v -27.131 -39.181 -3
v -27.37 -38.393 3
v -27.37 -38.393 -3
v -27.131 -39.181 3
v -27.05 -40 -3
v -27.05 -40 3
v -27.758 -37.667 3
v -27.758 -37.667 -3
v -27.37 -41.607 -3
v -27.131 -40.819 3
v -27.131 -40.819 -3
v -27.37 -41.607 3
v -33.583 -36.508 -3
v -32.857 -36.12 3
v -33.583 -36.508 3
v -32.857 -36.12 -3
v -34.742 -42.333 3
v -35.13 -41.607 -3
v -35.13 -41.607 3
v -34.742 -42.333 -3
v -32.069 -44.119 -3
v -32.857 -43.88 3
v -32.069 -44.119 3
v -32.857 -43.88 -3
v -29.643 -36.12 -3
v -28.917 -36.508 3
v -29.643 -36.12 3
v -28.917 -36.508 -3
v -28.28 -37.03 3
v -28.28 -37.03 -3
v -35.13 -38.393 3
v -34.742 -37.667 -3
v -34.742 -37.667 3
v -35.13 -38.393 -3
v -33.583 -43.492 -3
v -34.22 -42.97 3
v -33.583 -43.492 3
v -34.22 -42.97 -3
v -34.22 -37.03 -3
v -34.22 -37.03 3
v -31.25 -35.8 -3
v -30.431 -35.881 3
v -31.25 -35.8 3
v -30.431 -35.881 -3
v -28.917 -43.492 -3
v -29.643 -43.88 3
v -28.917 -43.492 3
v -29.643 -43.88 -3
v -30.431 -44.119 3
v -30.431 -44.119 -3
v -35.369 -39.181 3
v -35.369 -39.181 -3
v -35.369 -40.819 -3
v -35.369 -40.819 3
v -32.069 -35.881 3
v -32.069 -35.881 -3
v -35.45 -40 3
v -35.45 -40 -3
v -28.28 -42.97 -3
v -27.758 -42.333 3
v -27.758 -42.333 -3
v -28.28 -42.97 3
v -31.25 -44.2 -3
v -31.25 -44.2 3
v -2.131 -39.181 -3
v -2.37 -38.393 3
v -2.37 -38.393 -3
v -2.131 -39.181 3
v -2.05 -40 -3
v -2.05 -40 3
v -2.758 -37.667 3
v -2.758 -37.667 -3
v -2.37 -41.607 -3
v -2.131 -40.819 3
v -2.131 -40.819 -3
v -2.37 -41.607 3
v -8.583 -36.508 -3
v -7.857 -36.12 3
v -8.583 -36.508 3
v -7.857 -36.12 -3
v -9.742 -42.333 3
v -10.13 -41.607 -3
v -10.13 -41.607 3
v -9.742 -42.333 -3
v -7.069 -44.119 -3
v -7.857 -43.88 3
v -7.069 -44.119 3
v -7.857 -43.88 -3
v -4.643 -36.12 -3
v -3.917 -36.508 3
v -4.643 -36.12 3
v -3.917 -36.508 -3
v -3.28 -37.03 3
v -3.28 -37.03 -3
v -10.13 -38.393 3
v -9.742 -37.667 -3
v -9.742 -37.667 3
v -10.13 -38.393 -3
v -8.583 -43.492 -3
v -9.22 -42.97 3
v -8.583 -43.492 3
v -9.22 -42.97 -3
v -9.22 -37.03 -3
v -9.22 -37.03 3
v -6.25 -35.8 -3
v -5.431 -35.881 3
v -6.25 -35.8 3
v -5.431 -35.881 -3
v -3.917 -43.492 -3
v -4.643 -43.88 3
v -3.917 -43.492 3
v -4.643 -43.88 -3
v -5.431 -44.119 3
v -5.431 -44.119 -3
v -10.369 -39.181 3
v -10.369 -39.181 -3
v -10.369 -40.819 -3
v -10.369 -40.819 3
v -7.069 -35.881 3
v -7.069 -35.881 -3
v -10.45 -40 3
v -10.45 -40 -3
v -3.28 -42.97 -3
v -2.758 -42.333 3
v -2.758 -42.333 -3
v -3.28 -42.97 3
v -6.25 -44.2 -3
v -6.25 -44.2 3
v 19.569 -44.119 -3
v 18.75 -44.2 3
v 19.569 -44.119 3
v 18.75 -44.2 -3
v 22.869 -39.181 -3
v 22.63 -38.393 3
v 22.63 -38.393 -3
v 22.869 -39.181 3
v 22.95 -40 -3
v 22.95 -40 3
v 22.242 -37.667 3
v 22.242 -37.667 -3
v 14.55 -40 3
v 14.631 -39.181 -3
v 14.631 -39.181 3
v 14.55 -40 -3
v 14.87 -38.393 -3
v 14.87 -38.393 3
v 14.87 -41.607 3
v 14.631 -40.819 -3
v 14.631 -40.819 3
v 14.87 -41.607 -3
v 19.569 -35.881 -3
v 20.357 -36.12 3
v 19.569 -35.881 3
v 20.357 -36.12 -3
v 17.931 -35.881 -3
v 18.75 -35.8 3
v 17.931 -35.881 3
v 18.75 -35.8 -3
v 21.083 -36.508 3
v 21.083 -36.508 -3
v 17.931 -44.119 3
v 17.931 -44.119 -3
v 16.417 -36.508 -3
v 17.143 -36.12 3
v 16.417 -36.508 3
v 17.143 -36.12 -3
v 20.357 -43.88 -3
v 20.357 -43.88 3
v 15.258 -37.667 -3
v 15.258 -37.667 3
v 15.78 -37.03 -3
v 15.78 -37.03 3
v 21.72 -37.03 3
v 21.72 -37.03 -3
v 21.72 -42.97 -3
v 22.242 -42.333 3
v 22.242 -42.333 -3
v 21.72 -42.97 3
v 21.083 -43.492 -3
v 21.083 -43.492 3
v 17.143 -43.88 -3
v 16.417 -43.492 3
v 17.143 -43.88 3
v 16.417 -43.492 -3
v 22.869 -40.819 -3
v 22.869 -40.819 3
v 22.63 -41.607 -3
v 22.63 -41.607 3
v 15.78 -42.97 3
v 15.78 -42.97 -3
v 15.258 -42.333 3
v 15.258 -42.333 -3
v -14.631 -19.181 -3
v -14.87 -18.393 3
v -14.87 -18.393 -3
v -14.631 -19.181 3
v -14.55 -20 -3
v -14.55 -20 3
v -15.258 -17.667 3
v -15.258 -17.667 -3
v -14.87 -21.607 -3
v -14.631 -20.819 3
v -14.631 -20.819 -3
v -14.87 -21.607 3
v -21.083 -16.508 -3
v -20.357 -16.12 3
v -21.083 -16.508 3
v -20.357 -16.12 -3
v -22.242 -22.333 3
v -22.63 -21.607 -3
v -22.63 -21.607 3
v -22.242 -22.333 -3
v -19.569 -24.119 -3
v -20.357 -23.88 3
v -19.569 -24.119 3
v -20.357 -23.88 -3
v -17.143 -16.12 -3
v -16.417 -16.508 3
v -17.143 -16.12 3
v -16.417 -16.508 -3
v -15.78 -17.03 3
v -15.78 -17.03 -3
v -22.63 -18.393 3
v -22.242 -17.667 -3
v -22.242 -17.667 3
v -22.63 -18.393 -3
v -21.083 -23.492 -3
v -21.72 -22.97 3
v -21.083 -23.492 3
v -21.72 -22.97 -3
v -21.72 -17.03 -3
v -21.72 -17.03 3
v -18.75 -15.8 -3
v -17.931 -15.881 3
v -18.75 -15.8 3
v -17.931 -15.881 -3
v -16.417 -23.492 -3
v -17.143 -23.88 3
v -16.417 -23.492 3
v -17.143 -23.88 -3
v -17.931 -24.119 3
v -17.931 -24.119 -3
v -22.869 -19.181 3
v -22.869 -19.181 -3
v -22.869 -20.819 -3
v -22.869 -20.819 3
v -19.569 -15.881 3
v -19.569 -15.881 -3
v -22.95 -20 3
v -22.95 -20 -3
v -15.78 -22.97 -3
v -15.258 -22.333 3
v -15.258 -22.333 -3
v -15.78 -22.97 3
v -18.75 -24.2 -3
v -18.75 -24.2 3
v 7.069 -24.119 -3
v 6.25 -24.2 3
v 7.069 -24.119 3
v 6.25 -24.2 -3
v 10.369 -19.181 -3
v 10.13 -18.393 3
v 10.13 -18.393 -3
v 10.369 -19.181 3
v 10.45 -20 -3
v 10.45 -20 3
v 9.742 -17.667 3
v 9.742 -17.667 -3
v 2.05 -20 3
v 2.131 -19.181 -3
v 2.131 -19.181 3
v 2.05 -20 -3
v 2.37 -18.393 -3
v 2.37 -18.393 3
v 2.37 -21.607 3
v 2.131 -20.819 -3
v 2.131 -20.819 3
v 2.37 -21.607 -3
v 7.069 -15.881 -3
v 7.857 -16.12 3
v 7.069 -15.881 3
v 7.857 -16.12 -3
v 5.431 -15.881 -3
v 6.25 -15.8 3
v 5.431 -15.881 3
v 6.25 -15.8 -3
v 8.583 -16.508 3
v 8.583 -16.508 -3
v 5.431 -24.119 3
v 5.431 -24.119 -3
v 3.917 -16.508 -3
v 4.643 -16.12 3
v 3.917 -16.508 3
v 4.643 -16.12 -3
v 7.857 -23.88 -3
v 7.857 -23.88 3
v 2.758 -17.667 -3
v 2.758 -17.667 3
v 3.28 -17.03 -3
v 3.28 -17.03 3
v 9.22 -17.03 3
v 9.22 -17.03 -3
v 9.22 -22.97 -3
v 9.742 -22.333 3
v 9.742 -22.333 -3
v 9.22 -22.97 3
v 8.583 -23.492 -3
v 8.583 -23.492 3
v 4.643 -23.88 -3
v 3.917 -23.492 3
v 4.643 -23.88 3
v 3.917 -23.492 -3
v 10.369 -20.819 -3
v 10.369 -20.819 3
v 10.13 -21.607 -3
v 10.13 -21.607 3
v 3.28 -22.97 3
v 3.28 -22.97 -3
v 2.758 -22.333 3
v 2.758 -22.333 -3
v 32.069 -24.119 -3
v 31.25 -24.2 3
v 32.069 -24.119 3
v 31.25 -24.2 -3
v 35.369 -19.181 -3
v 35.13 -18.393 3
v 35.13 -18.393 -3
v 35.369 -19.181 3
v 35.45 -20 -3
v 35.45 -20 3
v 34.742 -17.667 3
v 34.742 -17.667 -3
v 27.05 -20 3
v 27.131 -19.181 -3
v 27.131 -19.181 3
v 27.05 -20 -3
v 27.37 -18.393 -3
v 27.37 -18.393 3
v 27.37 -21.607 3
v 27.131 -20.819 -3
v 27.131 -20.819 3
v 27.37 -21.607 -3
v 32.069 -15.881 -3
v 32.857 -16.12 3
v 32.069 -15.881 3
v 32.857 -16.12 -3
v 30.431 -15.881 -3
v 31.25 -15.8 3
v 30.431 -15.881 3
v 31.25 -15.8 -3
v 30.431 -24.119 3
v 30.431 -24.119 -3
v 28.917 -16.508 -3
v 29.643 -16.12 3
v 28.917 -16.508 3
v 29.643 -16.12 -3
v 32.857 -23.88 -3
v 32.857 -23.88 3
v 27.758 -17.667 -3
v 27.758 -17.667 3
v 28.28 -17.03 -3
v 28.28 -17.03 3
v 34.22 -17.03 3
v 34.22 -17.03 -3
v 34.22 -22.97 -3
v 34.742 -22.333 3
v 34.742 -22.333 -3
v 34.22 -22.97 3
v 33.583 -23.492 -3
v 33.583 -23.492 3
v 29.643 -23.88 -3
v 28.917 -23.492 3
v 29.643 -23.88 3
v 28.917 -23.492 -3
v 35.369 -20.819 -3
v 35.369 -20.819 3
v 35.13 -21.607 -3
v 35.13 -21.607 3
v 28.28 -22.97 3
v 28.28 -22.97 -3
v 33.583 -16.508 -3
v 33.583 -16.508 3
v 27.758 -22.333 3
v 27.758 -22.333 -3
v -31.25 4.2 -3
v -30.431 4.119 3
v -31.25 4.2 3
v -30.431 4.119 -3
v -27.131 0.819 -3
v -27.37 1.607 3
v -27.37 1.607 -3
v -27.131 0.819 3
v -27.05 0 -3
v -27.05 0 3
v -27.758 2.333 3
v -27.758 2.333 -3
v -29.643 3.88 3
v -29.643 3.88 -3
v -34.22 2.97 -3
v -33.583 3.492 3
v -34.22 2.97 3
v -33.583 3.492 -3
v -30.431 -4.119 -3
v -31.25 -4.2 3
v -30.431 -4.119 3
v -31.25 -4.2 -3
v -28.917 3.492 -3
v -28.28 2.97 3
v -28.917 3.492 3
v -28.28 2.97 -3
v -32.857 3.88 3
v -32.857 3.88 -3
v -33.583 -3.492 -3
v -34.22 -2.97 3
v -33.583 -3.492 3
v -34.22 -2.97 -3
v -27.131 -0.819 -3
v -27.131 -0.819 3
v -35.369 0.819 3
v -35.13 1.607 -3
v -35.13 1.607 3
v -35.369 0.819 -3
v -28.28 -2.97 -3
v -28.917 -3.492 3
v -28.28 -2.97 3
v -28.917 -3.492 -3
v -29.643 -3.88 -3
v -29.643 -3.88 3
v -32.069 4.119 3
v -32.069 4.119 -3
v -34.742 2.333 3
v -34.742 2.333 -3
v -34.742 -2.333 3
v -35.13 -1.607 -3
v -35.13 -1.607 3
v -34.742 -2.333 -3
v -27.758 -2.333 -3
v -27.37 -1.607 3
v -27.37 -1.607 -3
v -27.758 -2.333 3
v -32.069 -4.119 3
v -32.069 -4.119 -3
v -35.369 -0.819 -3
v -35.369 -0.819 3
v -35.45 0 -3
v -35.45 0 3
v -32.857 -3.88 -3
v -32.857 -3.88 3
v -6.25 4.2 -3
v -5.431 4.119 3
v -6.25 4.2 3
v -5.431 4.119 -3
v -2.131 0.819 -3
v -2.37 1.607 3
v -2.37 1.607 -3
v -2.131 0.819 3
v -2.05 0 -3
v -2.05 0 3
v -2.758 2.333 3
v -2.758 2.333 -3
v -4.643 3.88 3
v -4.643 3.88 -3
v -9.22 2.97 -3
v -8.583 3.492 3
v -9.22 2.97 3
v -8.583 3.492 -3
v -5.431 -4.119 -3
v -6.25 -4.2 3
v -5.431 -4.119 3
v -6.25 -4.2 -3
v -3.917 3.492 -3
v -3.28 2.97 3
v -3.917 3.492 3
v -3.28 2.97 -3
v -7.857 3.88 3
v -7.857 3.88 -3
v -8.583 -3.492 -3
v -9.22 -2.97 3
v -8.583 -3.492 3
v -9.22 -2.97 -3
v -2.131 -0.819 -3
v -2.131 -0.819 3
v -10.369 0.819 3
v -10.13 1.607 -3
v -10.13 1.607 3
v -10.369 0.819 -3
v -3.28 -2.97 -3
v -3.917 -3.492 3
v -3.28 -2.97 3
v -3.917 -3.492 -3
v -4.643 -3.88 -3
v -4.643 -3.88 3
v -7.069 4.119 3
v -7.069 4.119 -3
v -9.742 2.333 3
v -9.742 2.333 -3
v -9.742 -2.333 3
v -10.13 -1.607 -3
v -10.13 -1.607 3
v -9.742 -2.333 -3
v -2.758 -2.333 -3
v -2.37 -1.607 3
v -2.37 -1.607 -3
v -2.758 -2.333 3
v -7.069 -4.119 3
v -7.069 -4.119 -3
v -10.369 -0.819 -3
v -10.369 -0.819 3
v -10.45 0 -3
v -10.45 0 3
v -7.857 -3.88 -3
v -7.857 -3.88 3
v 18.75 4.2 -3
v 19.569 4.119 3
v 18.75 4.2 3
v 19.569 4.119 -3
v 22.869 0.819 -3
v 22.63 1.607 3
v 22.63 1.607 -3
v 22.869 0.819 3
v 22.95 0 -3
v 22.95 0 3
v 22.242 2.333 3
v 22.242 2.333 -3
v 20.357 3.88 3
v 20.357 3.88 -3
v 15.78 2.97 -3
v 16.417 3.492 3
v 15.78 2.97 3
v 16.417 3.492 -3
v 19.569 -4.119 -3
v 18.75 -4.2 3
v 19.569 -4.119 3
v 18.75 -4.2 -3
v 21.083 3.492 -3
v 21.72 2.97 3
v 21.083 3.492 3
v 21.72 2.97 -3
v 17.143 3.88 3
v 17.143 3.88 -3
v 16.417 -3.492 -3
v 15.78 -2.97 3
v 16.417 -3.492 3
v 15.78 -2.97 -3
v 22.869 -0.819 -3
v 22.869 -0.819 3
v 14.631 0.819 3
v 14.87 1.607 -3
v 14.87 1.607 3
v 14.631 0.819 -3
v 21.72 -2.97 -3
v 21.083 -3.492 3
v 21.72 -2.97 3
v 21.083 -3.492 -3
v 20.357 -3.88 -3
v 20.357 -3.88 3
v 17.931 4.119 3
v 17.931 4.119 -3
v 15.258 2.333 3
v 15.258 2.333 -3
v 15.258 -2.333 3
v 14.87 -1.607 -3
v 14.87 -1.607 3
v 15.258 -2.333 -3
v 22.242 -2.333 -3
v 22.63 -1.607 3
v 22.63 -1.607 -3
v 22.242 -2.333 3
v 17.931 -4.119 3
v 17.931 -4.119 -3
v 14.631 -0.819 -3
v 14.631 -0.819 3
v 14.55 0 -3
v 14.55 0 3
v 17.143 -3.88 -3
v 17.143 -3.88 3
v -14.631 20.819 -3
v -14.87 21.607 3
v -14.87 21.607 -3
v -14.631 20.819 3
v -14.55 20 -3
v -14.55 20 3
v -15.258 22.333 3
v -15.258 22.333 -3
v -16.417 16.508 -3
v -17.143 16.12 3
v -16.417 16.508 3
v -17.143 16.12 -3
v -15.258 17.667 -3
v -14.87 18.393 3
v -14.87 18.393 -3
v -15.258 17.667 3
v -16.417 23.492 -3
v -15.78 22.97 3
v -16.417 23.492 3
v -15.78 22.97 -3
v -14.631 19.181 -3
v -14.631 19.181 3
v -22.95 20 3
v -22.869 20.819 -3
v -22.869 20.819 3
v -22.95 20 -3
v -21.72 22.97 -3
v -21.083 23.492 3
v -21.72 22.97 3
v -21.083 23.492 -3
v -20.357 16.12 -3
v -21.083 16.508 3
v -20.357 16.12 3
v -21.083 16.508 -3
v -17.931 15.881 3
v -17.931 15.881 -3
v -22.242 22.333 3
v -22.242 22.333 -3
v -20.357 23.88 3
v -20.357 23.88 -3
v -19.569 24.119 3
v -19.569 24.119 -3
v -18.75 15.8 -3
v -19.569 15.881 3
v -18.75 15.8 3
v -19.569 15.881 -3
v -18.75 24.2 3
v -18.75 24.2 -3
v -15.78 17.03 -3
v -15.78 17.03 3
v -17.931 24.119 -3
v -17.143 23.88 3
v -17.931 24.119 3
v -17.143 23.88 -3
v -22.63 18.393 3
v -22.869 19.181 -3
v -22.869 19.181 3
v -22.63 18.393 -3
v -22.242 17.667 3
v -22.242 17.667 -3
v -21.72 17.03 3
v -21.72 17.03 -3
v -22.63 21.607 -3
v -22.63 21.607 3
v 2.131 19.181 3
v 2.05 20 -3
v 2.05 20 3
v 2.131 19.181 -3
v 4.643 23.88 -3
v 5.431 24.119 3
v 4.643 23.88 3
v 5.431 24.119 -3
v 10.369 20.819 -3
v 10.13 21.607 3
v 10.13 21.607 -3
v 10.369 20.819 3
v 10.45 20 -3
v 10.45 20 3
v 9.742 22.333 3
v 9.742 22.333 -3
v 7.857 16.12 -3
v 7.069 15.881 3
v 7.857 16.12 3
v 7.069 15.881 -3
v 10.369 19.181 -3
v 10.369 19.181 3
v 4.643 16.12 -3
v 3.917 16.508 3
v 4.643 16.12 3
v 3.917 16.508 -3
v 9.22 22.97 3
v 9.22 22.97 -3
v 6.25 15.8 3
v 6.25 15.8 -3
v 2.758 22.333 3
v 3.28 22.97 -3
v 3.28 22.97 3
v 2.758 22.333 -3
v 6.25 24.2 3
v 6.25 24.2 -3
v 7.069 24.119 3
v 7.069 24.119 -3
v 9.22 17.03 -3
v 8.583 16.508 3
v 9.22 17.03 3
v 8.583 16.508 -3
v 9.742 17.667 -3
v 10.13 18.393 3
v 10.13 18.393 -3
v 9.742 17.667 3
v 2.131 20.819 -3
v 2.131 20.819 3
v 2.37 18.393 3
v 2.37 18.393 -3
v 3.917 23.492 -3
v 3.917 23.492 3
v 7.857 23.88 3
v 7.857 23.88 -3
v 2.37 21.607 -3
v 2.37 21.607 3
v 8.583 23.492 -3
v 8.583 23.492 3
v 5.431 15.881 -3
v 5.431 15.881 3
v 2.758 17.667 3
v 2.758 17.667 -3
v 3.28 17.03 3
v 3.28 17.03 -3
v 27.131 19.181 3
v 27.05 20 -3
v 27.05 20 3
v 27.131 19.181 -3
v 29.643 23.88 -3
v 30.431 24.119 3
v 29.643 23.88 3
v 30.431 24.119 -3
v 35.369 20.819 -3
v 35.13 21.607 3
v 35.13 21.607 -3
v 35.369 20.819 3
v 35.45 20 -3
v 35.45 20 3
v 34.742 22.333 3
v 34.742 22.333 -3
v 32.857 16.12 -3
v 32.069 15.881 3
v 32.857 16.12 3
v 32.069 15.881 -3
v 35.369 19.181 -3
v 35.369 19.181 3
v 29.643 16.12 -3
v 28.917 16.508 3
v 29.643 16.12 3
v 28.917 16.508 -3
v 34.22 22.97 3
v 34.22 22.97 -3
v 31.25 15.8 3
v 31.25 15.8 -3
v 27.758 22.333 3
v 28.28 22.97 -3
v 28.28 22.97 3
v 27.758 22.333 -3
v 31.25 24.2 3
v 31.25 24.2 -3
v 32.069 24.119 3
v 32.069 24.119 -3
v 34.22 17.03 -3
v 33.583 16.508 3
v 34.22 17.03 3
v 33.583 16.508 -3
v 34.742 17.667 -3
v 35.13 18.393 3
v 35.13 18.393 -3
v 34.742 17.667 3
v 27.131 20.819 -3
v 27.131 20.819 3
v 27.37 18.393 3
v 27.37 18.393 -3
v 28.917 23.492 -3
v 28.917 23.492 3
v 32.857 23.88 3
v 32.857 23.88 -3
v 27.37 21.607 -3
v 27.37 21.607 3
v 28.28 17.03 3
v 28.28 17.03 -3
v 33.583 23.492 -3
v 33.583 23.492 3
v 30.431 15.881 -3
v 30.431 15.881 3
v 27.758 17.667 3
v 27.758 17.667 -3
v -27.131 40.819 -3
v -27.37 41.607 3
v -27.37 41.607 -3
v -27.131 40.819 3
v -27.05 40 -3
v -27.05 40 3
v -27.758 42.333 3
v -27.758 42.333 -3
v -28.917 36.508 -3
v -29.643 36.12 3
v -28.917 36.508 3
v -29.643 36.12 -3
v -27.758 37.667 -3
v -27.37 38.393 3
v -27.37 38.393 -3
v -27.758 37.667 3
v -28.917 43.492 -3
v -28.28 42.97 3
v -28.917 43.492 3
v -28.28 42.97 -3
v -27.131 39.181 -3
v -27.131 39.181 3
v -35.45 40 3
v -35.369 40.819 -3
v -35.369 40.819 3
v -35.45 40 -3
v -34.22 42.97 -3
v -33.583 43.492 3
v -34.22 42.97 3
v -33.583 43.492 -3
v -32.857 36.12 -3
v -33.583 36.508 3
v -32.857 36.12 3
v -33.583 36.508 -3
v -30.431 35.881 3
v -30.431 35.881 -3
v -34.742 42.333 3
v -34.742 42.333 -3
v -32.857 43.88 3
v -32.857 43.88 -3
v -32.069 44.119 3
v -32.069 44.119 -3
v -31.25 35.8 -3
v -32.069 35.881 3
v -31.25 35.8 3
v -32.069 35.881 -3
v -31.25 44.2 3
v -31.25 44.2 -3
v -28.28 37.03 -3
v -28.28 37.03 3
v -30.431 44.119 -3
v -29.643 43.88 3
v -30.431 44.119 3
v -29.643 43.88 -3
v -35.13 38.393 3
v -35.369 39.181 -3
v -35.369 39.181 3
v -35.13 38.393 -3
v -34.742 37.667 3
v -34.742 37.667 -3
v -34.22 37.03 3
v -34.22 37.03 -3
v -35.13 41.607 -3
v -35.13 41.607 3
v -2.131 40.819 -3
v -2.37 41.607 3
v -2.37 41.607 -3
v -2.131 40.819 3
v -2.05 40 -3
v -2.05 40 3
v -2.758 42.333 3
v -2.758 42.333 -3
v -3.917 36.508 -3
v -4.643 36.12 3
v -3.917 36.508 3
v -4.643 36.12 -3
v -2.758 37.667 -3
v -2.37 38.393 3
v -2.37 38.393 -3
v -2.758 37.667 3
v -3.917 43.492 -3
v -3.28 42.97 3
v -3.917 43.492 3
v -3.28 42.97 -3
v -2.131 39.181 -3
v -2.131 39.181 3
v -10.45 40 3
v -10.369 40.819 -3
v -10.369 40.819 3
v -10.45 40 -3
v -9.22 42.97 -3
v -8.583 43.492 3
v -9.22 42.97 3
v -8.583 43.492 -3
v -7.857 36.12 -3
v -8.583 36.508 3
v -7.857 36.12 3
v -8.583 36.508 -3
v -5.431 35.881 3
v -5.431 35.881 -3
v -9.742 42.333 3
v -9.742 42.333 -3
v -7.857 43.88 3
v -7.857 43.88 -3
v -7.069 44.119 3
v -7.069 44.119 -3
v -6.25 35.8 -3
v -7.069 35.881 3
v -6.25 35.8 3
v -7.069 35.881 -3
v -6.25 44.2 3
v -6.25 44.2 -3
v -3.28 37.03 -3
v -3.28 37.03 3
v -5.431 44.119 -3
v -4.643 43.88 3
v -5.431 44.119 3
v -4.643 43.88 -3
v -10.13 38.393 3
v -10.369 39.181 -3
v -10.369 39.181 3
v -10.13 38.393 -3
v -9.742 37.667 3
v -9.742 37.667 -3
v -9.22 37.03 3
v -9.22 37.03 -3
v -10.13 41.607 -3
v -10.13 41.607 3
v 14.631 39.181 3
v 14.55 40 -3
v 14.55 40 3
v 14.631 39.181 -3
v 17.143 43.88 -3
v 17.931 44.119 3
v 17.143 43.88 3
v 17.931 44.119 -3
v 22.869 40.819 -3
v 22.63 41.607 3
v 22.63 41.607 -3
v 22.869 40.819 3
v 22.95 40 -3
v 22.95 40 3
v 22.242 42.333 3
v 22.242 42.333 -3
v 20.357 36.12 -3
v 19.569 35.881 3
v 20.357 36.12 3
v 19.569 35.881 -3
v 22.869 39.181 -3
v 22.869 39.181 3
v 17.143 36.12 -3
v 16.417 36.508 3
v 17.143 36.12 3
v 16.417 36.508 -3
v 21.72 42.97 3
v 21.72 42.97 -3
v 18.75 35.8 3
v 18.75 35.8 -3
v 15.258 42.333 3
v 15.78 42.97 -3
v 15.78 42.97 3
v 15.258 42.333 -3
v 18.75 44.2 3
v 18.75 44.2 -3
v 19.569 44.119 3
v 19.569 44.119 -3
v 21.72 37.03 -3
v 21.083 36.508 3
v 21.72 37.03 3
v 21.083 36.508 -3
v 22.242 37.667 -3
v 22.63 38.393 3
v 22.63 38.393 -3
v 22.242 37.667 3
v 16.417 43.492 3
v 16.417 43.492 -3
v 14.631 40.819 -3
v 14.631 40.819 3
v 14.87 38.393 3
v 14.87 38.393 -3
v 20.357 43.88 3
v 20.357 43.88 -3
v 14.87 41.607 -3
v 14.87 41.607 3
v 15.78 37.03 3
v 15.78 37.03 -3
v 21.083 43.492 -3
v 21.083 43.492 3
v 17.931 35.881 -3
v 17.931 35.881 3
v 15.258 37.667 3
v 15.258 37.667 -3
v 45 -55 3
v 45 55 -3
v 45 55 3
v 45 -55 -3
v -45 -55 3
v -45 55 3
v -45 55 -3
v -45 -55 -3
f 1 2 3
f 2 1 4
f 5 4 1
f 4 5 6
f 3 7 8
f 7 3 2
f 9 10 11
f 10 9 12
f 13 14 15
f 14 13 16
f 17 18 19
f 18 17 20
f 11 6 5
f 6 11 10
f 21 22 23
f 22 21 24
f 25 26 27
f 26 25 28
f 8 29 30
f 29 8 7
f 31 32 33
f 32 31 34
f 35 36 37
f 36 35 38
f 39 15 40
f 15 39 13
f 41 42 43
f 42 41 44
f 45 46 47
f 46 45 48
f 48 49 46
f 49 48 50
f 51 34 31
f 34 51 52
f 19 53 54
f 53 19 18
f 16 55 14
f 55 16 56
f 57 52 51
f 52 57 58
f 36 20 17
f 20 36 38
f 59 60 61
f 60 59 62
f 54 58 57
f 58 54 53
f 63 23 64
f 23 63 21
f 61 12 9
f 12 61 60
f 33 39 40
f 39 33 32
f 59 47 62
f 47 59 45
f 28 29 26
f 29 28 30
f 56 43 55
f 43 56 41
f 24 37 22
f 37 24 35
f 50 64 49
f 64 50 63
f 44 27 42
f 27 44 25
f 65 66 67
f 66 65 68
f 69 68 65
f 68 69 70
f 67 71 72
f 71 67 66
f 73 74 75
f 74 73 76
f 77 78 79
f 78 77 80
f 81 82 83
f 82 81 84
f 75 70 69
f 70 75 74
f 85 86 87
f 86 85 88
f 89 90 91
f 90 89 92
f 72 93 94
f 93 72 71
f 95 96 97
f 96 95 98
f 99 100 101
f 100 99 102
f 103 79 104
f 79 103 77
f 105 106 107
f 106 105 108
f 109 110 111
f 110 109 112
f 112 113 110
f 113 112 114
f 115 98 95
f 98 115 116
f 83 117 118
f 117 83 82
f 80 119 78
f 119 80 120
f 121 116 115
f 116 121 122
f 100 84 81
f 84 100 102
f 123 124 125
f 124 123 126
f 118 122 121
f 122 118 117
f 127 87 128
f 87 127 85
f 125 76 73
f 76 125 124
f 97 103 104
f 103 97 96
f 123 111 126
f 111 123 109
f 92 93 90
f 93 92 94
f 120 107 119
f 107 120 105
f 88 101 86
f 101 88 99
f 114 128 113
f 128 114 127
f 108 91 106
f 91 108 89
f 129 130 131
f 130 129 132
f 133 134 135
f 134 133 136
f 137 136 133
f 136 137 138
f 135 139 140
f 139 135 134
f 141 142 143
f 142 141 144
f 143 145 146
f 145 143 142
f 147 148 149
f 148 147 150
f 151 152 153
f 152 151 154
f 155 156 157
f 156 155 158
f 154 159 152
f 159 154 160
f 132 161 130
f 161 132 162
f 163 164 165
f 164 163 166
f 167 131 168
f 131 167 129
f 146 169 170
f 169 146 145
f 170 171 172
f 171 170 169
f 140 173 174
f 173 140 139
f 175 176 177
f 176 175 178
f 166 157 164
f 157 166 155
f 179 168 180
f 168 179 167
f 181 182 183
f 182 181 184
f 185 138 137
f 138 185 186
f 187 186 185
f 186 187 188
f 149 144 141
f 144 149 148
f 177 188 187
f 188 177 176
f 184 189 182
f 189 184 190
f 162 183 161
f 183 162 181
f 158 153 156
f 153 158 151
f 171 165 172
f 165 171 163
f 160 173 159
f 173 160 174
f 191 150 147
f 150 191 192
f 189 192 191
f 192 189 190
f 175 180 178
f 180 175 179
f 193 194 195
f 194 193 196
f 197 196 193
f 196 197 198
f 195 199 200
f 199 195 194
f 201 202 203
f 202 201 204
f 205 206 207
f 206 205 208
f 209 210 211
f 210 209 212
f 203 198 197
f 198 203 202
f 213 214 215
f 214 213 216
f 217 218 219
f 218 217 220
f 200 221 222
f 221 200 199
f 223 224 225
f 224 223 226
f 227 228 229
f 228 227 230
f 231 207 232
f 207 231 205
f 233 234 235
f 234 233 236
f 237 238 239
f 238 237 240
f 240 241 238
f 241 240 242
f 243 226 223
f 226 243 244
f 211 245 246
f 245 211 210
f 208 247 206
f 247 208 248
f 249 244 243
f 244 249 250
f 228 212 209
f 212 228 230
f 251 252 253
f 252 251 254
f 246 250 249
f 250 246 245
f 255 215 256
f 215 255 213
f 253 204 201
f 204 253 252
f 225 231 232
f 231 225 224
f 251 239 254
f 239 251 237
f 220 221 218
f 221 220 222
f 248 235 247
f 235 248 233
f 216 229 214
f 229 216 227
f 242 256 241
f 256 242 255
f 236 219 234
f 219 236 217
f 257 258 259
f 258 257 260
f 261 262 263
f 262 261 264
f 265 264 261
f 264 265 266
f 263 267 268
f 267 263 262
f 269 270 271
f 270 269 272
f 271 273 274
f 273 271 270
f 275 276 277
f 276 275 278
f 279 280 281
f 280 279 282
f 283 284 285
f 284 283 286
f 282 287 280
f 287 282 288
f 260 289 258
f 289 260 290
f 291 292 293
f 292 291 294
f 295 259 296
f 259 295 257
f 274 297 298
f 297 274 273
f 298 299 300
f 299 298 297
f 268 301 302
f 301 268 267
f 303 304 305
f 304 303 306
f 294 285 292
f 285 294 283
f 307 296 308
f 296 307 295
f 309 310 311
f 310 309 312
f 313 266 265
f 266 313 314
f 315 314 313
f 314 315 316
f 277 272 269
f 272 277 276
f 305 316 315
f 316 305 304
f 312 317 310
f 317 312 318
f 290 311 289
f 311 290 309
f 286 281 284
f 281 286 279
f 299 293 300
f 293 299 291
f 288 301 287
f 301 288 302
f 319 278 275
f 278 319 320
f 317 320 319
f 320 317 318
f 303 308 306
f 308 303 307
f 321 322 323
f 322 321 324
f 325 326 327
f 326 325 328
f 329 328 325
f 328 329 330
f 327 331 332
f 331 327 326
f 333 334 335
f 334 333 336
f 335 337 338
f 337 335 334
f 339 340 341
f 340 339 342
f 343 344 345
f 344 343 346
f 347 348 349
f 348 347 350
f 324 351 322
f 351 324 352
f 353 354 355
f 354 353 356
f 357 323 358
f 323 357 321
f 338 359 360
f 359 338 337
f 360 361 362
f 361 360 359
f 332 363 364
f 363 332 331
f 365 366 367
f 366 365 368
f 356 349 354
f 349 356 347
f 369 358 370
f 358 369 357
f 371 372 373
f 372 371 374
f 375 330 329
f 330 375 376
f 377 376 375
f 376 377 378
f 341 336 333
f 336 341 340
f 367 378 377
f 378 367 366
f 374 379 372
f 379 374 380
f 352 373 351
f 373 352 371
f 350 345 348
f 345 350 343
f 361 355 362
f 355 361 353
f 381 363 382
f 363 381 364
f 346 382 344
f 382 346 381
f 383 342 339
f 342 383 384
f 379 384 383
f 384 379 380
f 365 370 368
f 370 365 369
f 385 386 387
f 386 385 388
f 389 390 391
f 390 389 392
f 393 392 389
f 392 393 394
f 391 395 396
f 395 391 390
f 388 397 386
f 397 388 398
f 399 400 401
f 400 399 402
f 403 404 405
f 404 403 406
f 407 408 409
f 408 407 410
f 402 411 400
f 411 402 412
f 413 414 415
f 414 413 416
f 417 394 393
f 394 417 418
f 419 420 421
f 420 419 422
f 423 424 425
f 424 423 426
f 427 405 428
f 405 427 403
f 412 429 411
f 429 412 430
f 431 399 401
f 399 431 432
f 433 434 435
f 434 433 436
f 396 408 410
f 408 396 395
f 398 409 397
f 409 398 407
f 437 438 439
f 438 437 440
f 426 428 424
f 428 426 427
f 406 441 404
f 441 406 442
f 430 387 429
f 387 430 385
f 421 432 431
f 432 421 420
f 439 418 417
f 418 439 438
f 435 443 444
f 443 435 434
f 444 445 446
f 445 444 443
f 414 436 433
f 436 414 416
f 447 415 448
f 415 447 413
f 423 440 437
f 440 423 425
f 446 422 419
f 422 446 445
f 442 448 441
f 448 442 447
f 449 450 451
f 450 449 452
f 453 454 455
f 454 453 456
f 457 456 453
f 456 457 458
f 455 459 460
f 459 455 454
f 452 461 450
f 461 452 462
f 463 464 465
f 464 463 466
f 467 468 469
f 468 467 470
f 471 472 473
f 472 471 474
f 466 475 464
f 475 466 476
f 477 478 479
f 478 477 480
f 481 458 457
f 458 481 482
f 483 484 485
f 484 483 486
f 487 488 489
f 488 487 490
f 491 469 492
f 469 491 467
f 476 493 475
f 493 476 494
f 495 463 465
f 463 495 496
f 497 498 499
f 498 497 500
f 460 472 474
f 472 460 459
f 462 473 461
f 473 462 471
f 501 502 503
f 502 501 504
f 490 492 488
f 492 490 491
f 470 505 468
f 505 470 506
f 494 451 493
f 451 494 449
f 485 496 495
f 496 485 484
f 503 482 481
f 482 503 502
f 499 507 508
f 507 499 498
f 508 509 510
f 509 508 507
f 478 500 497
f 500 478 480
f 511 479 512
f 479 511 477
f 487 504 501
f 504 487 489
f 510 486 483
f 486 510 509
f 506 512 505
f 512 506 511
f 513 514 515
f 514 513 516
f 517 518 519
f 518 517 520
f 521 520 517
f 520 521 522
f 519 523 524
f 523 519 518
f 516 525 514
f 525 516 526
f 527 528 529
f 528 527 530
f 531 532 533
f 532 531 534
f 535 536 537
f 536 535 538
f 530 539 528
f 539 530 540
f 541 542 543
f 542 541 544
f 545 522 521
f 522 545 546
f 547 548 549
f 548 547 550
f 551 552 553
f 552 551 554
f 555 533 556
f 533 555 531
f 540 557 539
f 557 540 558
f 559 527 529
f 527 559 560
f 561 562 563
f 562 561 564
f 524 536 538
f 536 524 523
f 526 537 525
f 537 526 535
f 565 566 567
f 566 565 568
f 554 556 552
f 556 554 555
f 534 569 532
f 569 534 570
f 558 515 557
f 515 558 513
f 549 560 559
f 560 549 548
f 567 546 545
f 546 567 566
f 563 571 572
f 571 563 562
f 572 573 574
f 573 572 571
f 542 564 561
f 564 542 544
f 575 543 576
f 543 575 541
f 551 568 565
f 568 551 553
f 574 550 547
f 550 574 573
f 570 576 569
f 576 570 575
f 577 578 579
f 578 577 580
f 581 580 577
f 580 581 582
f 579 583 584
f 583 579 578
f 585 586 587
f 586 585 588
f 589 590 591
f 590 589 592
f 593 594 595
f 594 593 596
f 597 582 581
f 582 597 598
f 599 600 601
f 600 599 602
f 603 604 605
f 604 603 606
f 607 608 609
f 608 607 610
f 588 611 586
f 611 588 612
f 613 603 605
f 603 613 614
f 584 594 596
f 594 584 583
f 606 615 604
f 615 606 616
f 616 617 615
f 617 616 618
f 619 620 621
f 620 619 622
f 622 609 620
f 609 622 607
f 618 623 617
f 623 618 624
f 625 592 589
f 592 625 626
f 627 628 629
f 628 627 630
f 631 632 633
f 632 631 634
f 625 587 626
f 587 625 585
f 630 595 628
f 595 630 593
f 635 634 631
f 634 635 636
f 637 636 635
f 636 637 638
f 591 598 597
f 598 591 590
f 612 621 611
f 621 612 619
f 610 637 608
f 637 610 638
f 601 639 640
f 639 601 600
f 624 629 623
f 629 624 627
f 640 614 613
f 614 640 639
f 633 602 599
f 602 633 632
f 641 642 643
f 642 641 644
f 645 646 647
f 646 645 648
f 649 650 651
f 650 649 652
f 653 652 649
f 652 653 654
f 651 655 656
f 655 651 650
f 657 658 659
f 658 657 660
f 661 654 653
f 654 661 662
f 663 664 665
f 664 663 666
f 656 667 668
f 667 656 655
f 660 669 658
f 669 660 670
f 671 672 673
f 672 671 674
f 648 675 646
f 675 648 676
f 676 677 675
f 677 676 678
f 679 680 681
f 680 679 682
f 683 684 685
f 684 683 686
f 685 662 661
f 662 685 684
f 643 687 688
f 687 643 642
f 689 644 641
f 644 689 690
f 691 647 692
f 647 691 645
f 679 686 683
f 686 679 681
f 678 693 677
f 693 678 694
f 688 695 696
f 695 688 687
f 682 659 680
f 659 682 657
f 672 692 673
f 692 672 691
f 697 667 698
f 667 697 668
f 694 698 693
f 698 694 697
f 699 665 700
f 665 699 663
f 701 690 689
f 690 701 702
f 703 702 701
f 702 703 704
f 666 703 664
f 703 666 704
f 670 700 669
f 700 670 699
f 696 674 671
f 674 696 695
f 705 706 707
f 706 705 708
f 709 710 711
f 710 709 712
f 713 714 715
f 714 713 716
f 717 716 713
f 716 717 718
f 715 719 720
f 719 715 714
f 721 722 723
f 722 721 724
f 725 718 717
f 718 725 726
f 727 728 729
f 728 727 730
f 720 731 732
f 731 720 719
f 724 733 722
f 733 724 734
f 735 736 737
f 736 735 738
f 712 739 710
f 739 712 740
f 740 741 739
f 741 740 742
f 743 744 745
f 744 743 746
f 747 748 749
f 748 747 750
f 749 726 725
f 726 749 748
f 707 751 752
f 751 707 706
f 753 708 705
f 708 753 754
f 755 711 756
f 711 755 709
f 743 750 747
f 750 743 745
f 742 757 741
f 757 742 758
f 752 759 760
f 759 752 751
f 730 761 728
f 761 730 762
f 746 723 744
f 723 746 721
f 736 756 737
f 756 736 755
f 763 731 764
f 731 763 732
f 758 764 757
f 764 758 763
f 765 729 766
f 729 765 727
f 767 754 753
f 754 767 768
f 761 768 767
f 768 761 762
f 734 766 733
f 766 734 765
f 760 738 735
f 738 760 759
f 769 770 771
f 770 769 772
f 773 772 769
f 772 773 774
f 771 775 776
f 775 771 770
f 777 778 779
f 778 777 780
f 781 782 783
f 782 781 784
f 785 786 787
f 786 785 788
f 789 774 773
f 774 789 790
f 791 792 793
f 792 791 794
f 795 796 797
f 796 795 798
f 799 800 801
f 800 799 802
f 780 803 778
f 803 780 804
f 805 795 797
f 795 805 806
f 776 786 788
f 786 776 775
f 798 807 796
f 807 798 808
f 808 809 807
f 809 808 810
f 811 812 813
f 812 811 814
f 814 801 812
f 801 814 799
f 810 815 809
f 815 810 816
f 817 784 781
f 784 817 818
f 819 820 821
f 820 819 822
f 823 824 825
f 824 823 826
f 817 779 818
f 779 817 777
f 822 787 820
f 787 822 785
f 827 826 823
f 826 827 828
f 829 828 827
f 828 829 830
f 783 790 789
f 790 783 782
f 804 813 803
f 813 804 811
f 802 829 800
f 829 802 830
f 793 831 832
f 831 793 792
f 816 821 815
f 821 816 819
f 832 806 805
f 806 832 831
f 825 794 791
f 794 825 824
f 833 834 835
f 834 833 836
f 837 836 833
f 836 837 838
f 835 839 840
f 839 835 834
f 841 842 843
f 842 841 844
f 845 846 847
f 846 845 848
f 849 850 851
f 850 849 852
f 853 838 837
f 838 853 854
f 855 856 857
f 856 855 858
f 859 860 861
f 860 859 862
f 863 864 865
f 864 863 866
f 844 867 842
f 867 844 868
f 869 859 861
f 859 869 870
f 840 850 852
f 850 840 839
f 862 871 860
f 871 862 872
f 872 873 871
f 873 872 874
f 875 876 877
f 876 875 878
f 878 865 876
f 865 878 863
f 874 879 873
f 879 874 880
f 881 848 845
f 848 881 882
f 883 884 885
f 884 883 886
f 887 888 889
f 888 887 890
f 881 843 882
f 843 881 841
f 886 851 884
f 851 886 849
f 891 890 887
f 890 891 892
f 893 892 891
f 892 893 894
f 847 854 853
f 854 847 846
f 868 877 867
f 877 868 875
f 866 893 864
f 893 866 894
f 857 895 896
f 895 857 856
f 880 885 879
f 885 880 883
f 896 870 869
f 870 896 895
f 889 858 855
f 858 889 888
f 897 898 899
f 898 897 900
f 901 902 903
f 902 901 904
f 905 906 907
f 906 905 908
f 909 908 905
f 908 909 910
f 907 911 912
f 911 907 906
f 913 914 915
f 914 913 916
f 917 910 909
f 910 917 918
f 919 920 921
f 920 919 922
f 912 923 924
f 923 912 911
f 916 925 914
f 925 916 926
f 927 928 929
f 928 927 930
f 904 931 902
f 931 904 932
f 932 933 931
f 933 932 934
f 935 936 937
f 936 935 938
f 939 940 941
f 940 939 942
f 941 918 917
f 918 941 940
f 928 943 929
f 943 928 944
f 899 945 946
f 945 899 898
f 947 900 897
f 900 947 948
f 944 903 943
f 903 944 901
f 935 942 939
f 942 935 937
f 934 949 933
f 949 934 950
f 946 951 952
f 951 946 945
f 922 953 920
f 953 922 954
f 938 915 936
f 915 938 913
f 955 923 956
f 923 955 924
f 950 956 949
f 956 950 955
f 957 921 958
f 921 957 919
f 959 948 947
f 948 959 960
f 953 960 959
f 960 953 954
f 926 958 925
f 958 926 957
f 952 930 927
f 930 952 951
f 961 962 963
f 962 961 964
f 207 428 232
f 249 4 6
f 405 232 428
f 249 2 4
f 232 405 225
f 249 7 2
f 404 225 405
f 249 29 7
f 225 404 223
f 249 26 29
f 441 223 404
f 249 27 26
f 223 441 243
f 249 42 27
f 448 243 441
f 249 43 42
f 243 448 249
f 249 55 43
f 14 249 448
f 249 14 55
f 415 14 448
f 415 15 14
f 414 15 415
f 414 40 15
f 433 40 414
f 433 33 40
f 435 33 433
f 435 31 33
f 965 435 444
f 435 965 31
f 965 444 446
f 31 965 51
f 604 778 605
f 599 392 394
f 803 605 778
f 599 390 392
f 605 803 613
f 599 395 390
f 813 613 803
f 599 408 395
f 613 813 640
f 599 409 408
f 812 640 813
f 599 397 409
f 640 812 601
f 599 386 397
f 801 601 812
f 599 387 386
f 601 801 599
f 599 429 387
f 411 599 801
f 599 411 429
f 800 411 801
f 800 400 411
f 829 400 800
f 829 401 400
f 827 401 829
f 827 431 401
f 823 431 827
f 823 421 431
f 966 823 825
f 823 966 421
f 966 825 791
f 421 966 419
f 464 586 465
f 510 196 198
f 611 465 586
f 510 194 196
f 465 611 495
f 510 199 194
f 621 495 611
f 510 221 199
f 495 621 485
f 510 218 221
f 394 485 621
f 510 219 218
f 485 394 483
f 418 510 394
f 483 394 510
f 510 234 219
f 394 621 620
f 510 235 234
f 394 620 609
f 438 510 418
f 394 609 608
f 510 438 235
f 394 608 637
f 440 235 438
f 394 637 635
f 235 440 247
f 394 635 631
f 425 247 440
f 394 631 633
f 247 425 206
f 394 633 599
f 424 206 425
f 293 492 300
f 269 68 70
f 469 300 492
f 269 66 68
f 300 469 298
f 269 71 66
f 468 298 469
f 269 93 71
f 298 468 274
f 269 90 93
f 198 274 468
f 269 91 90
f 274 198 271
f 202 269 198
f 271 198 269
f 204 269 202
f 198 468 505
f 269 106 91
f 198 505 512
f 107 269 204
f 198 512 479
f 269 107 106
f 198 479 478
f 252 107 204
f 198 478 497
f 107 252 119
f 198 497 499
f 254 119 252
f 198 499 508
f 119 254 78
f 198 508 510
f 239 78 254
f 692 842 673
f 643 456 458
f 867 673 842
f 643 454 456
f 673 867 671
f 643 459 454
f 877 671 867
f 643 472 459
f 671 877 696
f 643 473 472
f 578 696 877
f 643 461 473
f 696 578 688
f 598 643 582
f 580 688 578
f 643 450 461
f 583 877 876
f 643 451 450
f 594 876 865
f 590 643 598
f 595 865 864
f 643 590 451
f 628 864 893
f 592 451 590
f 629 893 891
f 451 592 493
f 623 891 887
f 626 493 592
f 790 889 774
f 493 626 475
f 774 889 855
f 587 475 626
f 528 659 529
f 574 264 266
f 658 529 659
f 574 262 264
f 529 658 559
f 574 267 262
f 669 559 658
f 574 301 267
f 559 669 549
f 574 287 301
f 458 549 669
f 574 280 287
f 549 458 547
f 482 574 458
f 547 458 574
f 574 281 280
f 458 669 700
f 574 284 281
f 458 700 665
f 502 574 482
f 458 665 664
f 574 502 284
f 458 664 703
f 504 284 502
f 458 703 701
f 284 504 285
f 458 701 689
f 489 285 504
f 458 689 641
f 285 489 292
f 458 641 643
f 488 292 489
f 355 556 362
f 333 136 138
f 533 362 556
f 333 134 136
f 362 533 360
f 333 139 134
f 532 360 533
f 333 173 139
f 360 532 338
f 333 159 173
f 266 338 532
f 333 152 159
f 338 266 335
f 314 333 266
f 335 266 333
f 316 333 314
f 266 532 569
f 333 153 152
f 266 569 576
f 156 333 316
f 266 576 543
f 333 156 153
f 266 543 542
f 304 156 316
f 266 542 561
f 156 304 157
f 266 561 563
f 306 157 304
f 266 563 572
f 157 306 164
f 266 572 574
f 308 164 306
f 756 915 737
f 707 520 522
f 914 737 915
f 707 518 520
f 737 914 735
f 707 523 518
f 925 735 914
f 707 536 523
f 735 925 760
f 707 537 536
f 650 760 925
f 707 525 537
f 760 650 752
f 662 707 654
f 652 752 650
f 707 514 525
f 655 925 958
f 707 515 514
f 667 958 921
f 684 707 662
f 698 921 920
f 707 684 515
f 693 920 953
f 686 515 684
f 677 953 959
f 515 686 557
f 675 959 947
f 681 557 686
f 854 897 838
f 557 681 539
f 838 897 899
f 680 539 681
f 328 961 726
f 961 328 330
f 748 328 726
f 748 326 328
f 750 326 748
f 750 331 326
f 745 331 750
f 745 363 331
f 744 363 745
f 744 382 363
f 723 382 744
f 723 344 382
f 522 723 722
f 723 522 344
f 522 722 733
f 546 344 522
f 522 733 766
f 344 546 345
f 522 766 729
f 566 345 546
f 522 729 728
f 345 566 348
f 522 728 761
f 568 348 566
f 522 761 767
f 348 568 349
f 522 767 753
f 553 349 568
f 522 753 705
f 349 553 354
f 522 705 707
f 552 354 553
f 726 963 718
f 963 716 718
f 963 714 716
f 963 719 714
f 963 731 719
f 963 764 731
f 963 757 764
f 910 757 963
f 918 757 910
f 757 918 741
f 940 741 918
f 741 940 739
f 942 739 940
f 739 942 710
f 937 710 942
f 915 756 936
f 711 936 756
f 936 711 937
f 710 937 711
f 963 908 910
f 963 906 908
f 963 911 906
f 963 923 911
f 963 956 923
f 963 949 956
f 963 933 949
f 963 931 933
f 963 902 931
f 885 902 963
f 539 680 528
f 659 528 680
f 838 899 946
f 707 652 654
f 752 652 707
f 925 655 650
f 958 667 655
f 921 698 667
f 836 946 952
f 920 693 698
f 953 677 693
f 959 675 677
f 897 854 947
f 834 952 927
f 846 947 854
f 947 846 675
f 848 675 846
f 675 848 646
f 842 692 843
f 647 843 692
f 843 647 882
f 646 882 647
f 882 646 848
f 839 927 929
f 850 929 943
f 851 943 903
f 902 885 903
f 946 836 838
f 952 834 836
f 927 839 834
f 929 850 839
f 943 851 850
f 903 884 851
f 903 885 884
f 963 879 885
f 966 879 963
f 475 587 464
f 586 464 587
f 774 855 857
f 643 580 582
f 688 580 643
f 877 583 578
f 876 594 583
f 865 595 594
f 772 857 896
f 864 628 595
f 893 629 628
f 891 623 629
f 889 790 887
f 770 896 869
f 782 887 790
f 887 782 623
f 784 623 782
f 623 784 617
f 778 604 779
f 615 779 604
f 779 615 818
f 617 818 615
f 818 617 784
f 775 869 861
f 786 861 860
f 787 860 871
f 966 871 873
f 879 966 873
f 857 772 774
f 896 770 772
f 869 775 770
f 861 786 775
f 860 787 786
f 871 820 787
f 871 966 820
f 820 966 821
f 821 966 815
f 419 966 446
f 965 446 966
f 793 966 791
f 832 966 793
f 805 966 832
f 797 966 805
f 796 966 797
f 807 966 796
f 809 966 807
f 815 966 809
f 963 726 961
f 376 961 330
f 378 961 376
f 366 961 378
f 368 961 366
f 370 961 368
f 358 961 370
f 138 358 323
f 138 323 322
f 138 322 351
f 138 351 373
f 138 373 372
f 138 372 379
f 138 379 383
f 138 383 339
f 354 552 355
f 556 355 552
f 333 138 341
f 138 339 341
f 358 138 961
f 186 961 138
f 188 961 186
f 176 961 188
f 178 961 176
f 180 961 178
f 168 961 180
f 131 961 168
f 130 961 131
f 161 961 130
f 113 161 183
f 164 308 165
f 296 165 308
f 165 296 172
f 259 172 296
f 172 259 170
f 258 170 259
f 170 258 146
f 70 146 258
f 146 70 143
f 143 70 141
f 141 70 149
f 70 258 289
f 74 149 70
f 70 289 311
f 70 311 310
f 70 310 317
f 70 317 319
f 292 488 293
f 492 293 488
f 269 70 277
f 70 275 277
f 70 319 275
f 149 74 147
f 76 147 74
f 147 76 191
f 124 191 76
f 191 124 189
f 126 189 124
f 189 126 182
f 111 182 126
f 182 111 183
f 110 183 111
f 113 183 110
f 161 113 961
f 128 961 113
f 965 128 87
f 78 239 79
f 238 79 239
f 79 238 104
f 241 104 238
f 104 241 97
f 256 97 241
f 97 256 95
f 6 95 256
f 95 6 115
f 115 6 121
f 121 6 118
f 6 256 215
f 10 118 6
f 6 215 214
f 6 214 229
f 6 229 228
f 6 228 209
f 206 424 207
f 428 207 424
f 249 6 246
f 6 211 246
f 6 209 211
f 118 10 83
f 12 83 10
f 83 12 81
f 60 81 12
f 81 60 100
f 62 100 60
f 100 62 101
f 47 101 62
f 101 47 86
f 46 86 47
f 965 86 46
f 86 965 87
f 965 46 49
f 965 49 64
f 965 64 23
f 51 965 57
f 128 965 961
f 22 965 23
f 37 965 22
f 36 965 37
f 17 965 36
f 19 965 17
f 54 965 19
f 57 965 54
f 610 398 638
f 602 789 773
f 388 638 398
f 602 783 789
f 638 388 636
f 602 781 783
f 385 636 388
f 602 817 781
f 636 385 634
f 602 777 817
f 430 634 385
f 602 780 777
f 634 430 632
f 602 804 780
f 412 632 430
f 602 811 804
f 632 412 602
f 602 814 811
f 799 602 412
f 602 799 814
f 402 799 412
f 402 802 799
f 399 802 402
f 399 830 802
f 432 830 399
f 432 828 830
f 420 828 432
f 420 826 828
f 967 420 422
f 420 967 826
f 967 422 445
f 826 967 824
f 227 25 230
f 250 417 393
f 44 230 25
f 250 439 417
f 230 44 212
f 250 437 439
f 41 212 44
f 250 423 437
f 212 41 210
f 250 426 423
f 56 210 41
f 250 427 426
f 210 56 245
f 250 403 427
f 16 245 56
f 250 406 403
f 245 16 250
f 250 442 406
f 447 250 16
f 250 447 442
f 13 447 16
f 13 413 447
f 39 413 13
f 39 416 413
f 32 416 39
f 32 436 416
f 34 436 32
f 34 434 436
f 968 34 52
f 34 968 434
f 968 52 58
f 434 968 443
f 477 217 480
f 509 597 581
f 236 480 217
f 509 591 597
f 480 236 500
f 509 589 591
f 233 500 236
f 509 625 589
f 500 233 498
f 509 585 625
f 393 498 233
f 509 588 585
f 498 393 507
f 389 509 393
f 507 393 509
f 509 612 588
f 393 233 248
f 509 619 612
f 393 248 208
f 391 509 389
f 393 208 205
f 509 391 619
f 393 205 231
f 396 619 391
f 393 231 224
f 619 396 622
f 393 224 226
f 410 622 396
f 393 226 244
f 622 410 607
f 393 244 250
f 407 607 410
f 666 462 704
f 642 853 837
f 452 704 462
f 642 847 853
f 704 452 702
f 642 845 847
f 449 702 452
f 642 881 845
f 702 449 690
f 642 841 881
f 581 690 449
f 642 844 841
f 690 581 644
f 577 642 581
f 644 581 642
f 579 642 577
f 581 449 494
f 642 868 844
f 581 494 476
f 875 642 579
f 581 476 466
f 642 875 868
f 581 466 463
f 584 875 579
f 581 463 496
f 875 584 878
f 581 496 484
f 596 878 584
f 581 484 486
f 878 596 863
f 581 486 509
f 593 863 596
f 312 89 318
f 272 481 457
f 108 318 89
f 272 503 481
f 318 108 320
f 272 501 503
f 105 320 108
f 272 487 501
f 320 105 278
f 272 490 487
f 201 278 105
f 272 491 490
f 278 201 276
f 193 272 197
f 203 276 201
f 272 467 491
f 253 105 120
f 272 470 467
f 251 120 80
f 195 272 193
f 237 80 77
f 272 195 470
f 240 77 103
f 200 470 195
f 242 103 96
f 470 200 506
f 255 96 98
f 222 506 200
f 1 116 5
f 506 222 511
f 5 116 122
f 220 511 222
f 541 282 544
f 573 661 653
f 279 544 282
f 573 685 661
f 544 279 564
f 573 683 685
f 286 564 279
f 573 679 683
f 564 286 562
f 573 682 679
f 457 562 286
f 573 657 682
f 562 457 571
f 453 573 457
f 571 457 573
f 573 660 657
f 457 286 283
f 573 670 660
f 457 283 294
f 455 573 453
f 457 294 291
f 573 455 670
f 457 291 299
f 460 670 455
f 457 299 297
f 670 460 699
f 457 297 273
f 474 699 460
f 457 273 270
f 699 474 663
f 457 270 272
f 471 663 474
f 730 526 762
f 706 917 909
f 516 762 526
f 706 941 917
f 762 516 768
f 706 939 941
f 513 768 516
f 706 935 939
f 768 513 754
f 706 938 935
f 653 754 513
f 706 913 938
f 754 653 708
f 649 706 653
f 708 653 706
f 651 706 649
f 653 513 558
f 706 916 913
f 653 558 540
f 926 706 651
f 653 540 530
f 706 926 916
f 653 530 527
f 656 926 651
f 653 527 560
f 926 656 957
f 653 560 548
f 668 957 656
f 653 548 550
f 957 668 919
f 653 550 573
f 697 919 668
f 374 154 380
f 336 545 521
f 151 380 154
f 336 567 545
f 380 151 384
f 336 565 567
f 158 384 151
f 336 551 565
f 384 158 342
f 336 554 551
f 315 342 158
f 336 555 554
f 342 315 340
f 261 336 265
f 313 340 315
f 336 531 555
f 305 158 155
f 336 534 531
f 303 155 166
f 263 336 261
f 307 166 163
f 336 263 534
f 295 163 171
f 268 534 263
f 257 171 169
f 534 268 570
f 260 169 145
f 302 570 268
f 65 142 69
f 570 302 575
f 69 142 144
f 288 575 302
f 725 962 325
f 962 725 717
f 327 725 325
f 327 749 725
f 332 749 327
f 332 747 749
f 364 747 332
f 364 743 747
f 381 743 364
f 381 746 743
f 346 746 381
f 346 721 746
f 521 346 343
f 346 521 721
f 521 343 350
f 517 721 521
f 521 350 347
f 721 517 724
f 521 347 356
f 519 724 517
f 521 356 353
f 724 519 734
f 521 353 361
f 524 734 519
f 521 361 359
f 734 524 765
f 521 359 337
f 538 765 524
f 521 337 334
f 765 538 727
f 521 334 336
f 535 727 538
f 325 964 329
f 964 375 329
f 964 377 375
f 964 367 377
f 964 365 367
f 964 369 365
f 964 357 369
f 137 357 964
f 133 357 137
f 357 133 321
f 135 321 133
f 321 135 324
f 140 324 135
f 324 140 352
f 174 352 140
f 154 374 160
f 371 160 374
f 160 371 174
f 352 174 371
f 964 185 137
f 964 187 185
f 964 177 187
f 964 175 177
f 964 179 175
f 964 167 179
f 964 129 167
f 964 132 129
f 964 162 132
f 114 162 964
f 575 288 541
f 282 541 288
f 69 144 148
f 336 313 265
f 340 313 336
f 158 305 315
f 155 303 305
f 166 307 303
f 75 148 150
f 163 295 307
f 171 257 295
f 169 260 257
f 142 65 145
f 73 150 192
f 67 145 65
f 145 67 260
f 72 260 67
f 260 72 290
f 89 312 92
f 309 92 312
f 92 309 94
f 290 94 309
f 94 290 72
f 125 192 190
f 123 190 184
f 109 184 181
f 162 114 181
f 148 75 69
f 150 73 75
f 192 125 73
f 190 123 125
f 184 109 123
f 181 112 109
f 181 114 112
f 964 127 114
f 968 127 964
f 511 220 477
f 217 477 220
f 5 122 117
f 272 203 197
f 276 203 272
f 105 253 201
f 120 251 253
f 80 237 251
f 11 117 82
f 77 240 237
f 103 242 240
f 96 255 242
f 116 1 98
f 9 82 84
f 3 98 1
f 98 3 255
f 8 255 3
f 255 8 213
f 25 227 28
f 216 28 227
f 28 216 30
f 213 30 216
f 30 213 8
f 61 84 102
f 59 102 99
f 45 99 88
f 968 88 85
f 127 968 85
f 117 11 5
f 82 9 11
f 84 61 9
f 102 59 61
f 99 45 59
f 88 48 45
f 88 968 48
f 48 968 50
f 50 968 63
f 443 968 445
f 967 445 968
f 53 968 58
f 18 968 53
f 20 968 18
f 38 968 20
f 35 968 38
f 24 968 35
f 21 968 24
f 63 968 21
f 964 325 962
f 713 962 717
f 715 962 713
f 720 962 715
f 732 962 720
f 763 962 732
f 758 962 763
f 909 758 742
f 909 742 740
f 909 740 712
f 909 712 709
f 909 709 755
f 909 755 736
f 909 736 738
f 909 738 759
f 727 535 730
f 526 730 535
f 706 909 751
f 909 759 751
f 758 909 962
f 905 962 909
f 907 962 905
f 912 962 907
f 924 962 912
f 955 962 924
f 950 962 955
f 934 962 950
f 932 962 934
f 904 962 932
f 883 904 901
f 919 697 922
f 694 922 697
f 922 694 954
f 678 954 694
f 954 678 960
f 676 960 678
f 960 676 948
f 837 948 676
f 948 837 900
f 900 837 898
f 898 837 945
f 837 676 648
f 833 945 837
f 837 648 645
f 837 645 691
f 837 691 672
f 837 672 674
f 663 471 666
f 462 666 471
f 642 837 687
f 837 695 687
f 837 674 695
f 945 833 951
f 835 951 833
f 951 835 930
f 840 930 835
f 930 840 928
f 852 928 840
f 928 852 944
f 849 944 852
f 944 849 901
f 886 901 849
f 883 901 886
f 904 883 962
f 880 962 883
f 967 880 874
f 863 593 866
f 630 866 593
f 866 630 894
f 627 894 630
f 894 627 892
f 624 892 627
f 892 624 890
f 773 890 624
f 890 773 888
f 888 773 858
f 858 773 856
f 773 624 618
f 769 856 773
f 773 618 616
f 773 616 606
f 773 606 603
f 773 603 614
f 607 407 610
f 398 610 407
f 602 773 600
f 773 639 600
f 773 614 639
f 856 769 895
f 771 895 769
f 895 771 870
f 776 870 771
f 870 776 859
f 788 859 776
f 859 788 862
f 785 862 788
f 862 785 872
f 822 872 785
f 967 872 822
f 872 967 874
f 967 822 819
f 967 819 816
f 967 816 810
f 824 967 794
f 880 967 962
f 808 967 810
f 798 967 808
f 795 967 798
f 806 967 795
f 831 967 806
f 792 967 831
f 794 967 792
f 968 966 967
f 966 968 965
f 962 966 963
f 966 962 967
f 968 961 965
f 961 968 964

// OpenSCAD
$fn = 32;

// ----------------------------------------------------------------------
// Perforated panel 90 x 110 x 6
// 5 x 3 Ø8.4 holes, checker layout
// ----------------------------------------------------------------------

// --- parameters (mm) ---
panel = [90, 110, 6];  // overall size (x, y, z)
hole_d = 8.4;          // hole diameter
pitch_x = 25;          // hole pitch along X
pitch_y = 20;          // hole pitch along Y

// --- derived feature positions (mm) ---
margin = hole_d / 2 + 2;            // = 6.2   clearance from the panel edge
row_offset = pitch_x / 2;           // = 12.5   shift of every other row
cols = floor((panel[0] - 2 * margin - row_offset) / pitch_x) + 1;  // = 3   how many columns fit in X
rows = floor((panel[1] - 2 * margin) / pitch_y) + 1;  // = 5   how many rows fit in Y
span_x = (cols - 1) * pitch_x + row_offset;  // = 62.5   width of the field
span_y = (rows - 1) * pitch_y;      // = 80   height of the field
origin_x = -span_x / 2;             // = -31.25   X of the first hole
origin_y = -span_y / 2;             // = -40   Y of the first row
holes = rows * cols;                // = 15   holes in total
feature_centers = [
  [origin_x + 0 * pitch_x, origin_y + 0 * pitch_y],
  [origin_x + 1 * pitch_x, origin_y + 0 * pitch_y],
  [origin_x + 2 * pitch_x, origin_y + 0 * pitch_y],
  [origin_x + row_offset + 0 * pitch_x, origin_y + 1 * pitch_y],
  [origin_x + row_offset + 1 * pitch_x, origin_y + 1 * pitch_y],
  [origin_x + row_offset + 2 * pitch_x, origin_y + 1 * pitch_y],
  [origin_x + 0 * pitch_x, origin_y + 2 * pitch_y],
  [origin_x + 1 * pitch_x, origin_y + 2 * pitch_y],
  [origin_x + 2 * pitch_x, origin_y + 2 * pitch_y],
  [origin_x + row_offset + 0 * pitch_x, origin_y + 3 * pitch_y],
  [origin_x + row_offset + 1 * pitch_x, origin_y + 3 * pitch_y],
  [origin_x + row_offset + 2 * pitch_x, origin_y + 3 * pitch_y],
  [origin_x + 0 * pitch_x, origin_y + 4 * pitch_y],
  [origin_x + 1 * pitch_x, origin_y + 4 * pitch_y],
  [origin_x + 2 * pitch_x, origin_y + 4 * pitch_y]
];   // hole centres, used verbatim by the cutter loop

// panel outline, every hole through
difference() {
  cube(panel, center = true);
  for (centre = feature_centers)
    translate([centre[0], centre[1], 0])
      cylinder(d = hole_d, h = panel[2] + 2, center = true);
}
